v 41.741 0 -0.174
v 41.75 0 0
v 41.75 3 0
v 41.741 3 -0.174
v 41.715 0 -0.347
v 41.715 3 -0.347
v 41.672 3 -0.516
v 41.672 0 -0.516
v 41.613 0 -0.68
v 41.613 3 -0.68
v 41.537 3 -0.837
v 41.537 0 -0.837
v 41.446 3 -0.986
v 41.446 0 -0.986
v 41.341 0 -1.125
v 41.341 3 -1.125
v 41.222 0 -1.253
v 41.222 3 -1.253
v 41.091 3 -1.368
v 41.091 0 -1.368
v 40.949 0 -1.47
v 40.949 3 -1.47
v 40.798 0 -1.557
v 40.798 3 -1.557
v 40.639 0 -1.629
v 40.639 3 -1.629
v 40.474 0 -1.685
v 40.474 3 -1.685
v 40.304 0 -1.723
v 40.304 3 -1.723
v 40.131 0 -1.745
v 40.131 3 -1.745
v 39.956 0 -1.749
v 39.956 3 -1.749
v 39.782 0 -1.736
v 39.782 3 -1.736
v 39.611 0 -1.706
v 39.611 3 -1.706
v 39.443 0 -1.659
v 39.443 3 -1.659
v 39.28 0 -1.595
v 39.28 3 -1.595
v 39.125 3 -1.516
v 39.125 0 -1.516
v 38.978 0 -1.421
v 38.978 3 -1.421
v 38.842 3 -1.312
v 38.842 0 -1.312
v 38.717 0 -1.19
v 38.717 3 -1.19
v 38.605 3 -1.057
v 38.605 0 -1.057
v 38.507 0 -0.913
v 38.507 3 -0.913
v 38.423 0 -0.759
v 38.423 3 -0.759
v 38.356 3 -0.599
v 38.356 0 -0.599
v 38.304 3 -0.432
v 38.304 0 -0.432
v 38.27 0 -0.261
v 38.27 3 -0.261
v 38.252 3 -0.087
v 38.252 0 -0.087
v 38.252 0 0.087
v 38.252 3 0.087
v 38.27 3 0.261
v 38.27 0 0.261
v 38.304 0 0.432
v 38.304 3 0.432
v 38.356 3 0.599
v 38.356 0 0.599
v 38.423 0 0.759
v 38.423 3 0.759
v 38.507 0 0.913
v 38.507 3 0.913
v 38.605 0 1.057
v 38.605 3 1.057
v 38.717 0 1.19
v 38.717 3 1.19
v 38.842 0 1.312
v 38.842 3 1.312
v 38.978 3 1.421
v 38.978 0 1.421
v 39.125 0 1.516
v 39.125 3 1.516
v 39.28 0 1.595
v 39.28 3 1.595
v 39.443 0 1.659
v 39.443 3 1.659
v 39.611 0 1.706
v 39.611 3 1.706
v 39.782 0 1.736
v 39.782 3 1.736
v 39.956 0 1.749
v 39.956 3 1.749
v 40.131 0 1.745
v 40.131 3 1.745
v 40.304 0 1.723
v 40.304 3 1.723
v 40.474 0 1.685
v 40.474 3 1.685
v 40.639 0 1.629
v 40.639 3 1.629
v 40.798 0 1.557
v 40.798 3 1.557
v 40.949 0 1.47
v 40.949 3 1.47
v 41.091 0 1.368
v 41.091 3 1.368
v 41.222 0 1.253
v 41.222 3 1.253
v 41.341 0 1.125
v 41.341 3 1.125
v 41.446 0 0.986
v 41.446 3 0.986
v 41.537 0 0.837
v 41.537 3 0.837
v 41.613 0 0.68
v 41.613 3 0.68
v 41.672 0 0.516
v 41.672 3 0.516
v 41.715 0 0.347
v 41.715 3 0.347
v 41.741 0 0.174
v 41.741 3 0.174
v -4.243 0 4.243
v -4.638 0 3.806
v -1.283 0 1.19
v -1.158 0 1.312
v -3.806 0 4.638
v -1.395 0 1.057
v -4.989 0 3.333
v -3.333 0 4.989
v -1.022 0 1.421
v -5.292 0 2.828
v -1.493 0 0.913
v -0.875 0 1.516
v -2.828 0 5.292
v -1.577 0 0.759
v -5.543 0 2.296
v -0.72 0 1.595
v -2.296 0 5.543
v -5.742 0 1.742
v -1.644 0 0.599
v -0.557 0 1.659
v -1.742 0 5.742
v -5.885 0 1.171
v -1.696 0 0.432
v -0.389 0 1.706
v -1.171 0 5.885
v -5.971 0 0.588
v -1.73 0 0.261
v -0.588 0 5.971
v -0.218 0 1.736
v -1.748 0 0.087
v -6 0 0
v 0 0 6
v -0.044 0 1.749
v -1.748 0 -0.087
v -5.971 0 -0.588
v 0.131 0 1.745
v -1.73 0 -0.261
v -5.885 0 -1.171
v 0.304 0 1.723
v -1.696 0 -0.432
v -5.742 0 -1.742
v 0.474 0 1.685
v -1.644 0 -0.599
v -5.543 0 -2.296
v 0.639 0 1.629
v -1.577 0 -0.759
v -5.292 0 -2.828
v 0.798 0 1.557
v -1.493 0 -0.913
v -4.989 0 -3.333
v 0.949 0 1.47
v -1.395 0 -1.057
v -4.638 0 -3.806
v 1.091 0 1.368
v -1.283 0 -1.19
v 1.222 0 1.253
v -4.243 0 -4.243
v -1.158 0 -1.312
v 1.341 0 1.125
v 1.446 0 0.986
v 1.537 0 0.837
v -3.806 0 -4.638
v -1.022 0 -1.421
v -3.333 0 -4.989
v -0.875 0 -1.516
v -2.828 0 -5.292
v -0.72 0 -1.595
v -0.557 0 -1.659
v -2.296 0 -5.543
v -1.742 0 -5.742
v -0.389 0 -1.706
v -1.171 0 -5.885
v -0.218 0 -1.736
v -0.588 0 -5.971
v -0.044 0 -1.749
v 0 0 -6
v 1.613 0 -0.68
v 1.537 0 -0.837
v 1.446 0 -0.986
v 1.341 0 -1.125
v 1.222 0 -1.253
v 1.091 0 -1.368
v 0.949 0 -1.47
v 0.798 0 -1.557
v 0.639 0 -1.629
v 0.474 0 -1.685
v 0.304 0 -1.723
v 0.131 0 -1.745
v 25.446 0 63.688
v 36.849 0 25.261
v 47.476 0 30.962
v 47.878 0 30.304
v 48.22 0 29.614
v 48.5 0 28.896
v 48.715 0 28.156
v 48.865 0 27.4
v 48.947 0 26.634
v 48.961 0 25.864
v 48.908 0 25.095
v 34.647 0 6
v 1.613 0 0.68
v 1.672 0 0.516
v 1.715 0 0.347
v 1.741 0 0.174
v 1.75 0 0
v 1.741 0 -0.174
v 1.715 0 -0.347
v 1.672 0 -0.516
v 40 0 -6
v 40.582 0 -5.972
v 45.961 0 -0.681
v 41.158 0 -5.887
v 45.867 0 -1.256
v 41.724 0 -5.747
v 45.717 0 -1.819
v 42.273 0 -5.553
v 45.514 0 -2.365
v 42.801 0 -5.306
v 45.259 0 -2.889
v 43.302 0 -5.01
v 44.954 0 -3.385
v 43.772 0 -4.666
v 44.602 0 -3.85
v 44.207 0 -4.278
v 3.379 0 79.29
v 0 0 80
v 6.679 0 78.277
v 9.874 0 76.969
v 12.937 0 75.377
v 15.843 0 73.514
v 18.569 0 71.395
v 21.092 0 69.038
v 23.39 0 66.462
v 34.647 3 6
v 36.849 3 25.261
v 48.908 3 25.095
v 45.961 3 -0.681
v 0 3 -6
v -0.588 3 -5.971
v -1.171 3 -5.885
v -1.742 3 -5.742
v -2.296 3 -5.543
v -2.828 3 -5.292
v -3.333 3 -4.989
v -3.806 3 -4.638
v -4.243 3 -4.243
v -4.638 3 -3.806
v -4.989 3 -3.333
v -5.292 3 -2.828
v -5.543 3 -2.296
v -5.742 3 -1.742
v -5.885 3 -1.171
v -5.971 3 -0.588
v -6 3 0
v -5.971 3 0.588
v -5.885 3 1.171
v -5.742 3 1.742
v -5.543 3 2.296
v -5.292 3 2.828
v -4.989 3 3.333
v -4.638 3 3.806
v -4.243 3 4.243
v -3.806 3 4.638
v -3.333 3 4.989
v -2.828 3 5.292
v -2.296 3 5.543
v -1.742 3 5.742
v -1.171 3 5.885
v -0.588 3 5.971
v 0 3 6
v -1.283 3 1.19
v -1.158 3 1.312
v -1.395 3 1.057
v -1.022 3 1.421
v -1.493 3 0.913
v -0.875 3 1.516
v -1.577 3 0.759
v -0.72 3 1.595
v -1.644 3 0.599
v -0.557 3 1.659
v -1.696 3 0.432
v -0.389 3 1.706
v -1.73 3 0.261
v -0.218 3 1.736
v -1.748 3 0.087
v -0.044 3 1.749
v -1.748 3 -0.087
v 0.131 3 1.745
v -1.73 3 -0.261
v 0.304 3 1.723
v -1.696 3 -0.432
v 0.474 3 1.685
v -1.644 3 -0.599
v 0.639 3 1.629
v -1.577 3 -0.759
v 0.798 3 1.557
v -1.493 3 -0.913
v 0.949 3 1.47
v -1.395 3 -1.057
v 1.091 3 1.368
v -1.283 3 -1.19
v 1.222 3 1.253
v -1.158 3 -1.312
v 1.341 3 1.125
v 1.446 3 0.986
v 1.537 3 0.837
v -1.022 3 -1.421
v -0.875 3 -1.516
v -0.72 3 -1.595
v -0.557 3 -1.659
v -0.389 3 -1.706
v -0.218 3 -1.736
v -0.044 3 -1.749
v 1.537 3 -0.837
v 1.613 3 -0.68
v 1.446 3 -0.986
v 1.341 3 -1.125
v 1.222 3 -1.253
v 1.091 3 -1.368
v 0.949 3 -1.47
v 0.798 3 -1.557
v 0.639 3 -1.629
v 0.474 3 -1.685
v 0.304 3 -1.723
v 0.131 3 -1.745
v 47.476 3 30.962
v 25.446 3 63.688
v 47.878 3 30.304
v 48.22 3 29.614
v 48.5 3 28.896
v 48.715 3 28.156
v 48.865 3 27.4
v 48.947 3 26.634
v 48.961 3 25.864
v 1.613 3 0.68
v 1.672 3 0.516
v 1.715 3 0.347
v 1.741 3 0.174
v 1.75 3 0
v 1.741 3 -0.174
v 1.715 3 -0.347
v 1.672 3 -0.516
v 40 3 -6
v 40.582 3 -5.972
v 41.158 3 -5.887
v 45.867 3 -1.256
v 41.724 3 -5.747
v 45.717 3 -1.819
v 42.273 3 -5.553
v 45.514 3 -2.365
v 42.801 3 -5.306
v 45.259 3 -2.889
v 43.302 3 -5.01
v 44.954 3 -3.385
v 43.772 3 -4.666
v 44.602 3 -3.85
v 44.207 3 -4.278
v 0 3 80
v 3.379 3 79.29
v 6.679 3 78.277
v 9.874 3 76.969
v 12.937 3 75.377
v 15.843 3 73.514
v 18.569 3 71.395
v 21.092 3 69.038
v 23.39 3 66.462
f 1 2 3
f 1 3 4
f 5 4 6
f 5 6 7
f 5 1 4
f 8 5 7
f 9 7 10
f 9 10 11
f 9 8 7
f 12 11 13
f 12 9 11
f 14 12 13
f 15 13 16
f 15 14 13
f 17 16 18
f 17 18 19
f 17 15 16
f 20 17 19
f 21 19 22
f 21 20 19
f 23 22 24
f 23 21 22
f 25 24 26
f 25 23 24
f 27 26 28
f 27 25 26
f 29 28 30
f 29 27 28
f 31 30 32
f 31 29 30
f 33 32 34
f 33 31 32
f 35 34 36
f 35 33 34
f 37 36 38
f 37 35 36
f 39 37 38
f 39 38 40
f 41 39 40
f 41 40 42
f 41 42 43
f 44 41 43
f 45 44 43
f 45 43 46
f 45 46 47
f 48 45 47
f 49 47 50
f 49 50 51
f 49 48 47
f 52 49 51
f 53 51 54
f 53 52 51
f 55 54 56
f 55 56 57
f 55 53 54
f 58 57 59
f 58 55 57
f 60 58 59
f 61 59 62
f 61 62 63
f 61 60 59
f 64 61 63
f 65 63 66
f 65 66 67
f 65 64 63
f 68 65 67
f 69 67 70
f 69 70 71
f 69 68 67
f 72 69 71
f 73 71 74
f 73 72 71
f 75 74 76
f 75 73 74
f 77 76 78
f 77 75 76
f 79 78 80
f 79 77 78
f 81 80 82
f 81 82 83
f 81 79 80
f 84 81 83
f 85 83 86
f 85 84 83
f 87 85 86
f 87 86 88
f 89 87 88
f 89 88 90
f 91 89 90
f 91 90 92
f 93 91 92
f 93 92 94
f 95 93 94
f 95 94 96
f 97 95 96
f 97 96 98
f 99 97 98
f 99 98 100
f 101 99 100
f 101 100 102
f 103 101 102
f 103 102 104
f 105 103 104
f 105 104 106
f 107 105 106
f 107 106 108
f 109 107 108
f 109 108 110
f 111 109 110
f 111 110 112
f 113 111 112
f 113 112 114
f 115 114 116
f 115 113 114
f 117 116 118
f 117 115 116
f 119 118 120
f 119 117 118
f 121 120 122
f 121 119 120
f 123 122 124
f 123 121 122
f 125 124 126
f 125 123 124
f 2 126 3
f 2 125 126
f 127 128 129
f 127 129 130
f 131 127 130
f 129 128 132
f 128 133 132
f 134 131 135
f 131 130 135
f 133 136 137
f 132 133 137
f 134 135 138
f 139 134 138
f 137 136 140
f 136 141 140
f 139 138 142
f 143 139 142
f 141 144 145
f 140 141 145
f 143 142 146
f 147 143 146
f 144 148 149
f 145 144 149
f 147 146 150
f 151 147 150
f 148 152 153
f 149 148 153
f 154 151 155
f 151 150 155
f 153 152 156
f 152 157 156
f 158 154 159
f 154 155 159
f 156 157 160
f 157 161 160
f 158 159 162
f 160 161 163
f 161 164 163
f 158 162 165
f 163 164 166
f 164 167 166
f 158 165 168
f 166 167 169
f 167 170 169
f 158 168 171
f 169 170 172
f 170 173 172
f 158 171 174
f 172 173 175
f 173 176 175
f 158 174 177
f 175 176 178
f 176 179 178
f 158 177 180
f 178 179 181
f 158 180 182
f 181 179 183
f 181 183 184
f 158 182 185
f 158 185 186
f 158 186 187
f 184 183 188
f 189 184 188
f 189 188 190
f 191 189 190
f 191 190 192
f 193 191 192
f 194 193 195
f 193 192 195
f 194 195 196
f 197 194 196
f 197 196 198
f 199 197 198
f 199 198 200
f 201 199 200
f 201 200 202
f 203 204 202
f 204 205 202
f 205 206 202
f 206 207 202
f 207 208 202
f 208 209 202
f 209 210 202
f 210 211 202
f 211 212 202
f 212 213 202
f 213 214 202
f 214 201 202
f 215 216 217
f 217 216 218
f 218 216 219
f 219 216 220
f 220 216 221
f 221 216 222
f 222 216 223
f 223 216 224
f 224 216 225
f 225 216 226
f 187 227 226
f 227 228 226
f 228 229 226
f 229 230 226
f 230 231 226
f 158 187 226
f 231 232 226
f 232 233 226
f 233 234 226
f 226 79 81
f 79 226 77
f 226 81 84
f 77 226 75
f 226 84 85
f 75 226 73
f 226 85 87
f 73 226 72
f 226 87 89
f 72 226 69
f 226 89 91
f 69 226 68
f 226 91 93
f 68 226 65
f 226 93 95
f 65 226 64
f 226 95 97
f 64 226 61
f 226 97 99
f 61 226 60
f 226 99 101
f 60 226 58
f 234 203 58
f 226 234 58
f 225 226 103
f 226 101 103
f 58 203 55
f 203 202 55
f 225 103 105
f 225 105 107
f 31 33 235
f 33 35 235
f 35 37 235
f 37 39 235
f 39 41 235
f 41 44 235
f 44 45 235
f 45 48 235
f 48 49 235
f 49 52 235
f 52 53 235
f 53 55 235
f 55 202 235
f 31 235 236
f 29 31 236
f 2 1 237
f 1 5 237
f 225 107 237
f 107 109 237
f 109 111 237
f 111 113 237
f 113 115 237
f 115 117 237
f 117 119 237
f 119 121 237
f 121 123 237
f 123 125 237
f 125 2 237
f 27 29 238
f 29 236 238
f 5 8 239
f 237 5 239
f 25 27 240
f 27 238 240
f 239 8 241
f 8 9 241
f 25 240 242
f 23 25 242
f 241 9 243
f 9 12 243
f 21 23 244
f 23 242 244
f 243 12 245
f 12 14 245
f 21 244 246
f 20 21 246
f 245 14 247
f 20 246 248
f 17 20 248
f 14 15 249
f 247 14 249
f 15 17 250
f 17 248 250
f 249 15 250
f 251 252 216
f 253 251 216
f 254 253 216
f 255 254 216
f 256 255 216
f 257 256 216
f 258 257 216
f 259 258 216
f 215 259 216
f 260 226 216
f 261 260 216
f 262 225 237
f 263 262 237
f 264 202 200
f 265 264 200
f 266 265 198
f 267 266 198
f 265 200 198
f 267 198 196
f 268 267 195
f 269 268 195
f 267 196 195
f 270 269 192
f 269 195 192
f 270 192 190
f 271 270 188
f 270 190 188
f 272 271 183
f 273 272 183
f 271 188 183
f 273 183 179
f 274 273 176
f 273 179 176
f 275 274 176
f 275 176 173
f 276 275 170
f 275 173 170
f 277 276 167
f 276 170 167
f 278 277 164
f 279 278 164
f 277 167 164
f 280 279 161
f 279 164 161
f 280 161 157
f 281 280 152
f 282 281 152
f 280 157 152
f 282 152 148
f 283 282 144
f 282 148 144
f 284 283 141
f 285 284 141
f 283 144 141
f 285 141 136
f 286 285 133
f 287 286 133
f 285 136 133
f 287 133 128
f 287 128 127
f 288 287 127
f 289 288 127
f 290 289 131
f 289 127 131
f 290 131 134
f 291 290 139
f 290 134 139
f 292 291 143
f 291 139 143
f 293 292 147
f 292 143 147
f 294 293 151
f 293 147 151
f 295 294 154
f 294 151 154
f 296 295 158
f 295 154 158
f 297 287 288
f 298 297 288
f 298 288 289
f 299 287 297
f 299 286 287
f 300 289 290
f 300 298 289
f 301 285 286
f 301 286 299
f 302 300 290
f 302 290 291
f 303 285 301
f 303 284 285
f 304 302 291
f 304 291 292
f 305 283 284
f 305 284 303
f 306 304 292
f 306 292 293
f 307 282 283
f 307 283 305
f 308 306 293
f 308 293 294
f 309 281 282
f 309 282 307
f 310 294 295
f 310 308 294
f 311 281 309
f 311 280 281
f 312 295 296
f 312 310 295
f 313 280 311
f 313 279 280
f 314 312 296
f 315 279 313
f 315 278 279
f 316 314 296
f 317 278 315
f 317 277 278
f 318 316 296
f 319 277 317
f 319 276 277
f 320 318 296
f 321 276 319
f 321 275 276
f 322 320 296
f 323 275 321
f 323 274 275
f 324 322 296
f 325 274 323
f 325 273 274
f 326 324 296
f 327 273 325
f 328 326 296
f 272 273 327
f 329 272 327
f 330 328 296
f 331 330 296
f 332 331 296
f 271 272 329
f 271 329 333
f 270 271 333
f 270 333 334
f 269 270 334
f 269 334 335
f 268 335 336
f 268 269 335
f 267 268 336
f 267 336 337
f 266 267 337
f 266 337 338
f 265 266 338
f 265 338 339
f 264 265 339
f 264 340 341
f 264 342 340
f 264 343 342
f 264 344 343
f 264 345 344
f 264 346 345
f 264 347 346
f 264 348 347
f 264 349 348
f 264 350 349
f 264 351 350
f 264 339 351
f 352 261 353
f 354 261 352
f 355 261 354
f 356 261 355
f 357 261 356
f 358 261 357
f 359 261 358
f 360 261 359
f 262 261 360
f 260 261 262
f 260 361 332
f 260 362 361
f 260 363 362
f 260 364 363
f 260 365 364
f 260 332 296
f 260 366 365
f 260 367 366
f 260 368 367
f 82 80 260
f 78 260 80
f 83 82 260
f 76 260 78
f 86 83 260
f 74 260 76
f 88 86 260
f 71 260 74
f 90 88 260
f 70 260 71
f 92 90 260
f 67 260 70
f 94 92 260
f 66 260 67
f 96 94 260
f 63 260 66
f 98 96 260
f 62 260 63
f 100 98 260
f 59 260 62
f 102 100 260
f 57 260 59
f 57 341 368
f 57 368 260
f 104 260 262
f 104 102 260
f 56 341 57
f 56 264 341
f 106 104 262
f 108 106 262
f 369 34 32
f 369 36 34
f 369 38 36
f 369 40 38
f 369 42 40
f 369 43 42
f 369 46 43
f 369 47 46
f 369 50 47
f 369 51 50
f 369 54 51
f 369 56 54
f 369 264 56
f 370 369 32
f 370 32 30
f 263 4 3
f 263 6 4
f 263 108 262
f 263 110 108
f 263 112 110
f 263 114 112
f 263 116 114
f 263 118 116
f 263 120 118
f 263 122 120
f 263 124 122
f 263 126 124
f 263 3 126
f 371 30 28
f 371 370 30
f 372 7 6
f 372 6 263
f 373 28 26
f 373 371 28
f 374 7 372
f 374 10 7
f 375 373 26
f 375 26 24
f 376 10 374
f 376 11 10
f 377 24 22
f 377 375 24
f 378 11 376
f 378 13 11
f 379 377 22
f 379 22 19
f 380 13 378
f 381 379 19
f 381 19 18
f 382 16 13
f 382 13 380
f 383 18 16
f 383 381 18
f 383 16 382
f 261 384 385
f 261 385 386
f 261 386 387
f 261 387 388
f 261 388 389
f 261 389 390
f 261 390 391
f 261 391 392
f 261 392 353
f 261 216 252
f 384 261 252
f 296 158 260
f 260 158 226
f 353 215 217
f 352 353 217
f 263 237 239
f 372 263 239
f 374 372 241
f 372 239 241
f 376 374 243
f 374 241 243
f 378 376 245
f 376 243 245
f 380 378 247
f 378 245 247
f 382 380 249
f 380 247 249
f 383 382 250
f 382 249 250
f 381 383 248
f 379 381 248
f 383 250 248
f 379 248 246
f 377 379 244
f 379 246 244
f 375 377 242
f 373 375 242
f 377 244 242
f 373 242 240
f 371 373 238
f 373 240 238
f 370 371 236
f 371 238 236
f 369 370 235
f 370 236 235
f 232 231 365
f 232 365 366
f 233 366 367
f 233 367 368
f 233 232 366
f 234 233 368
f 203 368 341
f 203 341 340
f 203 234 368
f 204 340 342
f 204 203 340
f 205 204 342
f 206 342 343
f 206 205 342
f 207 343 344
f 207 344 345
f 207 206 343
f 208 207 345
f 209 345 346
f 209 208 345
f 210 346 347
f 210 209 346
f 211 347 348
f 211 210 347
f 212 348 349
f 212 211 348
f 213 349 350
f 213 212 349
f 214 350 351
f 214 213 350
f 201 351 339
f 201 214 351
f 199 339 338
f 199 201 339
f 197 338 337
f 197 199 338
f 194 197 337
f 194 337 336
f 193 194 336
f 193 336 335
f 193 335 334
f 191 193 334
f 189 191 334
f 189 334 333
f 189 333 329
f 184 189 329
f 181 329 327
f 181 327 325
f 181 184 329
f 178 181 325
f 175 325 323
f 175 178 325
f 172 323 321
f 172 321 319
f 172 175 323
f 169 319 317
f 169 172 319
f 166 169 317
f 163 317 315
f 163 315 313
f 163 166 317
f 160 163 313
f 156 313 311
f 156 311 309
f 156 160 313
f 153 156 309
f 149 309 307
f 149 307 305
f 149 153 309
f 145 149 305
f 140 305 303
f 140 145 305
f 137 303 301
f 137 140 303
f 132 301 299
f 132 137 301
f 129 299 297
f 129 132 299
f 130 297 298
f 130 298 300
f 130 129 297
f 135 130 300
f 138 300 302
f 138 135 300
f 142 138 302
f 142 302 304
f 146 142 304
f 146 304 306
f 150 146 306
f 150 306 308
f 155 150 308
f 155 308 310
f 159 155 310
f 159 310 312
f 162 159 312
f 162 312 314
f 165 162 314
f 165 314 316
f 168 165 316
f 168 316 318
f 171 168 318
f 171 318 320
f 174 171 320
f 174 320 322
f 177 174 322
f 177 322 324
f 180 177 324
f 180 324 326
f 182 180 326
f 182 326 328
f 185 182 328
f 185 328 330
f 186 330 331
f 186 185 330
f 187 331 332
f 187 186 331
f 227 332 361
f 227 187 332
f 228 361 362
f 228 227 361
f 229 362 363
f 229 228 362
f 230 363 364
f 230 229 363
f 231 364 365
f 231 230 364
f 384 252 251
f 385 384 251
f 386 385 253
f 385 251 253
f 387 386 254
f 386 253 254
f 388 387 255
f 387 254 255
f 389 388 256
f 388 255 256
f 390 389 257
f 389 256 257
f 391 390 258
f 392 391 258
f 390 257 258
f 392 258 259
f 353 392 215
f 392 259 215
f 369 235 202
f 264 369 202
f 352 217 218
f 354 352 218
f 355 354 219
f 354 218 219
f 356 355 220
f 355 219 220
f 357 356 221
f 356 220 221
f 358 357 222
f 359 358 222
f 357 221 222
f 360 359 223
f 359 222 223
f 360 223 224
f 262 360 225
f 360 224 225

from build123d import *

# Parameters (mm, degrees)
SKETCH_1_R      = 1.75
EXTRUDE_1_DEPTH = 3


with BuildPart() as part:
    # 草圖1 → 填料-伸長1 (new body)
    with BuildSketch(Plane(origin=(0, 0, 0), x_dir=(1, 0, 0), z_dir=(0, 1, 0))):
        with BuildLine():
            Line((36.848566664, -25.260597764), (0, -80))
            ThreePointArc((0, -80), (14.411400344, -74.478032661), (25.446019232, -63.68832603))
            Line((25.446019232, -63.68832603), (47.47618504, -30.962002684))
            ThreePointArc((47.47618504, -30.962002684), (48.715425732, -28.156234166), (48.907790247, -25.095017029))
            Line((48.907790247, -25.095017029), (45.961176943, 0.681446592))
            ThreePointArc((45.961176943, 0.681446592), (43.994453683, 4.477090548), (40, 6))
            Line((40, 6), (0, 6))
            ThreePointArc((0, 6), (-6, 0), (0, -6))
            Line((0, -6), (34.646808717, -6))
            Line((34.646808717, -6), (36.848566664, -25.260597764))
        make_face()
        with Locations((40, 0)):
            Circle(SKETCH_1_R, mode=Mode.SUBTRACT)
        Circle(SKETCH_1_R, mode=Mode.SUBTRACT)
    extrude(amount=EXTRUDE_1_DEPTH)


solid = part.part
